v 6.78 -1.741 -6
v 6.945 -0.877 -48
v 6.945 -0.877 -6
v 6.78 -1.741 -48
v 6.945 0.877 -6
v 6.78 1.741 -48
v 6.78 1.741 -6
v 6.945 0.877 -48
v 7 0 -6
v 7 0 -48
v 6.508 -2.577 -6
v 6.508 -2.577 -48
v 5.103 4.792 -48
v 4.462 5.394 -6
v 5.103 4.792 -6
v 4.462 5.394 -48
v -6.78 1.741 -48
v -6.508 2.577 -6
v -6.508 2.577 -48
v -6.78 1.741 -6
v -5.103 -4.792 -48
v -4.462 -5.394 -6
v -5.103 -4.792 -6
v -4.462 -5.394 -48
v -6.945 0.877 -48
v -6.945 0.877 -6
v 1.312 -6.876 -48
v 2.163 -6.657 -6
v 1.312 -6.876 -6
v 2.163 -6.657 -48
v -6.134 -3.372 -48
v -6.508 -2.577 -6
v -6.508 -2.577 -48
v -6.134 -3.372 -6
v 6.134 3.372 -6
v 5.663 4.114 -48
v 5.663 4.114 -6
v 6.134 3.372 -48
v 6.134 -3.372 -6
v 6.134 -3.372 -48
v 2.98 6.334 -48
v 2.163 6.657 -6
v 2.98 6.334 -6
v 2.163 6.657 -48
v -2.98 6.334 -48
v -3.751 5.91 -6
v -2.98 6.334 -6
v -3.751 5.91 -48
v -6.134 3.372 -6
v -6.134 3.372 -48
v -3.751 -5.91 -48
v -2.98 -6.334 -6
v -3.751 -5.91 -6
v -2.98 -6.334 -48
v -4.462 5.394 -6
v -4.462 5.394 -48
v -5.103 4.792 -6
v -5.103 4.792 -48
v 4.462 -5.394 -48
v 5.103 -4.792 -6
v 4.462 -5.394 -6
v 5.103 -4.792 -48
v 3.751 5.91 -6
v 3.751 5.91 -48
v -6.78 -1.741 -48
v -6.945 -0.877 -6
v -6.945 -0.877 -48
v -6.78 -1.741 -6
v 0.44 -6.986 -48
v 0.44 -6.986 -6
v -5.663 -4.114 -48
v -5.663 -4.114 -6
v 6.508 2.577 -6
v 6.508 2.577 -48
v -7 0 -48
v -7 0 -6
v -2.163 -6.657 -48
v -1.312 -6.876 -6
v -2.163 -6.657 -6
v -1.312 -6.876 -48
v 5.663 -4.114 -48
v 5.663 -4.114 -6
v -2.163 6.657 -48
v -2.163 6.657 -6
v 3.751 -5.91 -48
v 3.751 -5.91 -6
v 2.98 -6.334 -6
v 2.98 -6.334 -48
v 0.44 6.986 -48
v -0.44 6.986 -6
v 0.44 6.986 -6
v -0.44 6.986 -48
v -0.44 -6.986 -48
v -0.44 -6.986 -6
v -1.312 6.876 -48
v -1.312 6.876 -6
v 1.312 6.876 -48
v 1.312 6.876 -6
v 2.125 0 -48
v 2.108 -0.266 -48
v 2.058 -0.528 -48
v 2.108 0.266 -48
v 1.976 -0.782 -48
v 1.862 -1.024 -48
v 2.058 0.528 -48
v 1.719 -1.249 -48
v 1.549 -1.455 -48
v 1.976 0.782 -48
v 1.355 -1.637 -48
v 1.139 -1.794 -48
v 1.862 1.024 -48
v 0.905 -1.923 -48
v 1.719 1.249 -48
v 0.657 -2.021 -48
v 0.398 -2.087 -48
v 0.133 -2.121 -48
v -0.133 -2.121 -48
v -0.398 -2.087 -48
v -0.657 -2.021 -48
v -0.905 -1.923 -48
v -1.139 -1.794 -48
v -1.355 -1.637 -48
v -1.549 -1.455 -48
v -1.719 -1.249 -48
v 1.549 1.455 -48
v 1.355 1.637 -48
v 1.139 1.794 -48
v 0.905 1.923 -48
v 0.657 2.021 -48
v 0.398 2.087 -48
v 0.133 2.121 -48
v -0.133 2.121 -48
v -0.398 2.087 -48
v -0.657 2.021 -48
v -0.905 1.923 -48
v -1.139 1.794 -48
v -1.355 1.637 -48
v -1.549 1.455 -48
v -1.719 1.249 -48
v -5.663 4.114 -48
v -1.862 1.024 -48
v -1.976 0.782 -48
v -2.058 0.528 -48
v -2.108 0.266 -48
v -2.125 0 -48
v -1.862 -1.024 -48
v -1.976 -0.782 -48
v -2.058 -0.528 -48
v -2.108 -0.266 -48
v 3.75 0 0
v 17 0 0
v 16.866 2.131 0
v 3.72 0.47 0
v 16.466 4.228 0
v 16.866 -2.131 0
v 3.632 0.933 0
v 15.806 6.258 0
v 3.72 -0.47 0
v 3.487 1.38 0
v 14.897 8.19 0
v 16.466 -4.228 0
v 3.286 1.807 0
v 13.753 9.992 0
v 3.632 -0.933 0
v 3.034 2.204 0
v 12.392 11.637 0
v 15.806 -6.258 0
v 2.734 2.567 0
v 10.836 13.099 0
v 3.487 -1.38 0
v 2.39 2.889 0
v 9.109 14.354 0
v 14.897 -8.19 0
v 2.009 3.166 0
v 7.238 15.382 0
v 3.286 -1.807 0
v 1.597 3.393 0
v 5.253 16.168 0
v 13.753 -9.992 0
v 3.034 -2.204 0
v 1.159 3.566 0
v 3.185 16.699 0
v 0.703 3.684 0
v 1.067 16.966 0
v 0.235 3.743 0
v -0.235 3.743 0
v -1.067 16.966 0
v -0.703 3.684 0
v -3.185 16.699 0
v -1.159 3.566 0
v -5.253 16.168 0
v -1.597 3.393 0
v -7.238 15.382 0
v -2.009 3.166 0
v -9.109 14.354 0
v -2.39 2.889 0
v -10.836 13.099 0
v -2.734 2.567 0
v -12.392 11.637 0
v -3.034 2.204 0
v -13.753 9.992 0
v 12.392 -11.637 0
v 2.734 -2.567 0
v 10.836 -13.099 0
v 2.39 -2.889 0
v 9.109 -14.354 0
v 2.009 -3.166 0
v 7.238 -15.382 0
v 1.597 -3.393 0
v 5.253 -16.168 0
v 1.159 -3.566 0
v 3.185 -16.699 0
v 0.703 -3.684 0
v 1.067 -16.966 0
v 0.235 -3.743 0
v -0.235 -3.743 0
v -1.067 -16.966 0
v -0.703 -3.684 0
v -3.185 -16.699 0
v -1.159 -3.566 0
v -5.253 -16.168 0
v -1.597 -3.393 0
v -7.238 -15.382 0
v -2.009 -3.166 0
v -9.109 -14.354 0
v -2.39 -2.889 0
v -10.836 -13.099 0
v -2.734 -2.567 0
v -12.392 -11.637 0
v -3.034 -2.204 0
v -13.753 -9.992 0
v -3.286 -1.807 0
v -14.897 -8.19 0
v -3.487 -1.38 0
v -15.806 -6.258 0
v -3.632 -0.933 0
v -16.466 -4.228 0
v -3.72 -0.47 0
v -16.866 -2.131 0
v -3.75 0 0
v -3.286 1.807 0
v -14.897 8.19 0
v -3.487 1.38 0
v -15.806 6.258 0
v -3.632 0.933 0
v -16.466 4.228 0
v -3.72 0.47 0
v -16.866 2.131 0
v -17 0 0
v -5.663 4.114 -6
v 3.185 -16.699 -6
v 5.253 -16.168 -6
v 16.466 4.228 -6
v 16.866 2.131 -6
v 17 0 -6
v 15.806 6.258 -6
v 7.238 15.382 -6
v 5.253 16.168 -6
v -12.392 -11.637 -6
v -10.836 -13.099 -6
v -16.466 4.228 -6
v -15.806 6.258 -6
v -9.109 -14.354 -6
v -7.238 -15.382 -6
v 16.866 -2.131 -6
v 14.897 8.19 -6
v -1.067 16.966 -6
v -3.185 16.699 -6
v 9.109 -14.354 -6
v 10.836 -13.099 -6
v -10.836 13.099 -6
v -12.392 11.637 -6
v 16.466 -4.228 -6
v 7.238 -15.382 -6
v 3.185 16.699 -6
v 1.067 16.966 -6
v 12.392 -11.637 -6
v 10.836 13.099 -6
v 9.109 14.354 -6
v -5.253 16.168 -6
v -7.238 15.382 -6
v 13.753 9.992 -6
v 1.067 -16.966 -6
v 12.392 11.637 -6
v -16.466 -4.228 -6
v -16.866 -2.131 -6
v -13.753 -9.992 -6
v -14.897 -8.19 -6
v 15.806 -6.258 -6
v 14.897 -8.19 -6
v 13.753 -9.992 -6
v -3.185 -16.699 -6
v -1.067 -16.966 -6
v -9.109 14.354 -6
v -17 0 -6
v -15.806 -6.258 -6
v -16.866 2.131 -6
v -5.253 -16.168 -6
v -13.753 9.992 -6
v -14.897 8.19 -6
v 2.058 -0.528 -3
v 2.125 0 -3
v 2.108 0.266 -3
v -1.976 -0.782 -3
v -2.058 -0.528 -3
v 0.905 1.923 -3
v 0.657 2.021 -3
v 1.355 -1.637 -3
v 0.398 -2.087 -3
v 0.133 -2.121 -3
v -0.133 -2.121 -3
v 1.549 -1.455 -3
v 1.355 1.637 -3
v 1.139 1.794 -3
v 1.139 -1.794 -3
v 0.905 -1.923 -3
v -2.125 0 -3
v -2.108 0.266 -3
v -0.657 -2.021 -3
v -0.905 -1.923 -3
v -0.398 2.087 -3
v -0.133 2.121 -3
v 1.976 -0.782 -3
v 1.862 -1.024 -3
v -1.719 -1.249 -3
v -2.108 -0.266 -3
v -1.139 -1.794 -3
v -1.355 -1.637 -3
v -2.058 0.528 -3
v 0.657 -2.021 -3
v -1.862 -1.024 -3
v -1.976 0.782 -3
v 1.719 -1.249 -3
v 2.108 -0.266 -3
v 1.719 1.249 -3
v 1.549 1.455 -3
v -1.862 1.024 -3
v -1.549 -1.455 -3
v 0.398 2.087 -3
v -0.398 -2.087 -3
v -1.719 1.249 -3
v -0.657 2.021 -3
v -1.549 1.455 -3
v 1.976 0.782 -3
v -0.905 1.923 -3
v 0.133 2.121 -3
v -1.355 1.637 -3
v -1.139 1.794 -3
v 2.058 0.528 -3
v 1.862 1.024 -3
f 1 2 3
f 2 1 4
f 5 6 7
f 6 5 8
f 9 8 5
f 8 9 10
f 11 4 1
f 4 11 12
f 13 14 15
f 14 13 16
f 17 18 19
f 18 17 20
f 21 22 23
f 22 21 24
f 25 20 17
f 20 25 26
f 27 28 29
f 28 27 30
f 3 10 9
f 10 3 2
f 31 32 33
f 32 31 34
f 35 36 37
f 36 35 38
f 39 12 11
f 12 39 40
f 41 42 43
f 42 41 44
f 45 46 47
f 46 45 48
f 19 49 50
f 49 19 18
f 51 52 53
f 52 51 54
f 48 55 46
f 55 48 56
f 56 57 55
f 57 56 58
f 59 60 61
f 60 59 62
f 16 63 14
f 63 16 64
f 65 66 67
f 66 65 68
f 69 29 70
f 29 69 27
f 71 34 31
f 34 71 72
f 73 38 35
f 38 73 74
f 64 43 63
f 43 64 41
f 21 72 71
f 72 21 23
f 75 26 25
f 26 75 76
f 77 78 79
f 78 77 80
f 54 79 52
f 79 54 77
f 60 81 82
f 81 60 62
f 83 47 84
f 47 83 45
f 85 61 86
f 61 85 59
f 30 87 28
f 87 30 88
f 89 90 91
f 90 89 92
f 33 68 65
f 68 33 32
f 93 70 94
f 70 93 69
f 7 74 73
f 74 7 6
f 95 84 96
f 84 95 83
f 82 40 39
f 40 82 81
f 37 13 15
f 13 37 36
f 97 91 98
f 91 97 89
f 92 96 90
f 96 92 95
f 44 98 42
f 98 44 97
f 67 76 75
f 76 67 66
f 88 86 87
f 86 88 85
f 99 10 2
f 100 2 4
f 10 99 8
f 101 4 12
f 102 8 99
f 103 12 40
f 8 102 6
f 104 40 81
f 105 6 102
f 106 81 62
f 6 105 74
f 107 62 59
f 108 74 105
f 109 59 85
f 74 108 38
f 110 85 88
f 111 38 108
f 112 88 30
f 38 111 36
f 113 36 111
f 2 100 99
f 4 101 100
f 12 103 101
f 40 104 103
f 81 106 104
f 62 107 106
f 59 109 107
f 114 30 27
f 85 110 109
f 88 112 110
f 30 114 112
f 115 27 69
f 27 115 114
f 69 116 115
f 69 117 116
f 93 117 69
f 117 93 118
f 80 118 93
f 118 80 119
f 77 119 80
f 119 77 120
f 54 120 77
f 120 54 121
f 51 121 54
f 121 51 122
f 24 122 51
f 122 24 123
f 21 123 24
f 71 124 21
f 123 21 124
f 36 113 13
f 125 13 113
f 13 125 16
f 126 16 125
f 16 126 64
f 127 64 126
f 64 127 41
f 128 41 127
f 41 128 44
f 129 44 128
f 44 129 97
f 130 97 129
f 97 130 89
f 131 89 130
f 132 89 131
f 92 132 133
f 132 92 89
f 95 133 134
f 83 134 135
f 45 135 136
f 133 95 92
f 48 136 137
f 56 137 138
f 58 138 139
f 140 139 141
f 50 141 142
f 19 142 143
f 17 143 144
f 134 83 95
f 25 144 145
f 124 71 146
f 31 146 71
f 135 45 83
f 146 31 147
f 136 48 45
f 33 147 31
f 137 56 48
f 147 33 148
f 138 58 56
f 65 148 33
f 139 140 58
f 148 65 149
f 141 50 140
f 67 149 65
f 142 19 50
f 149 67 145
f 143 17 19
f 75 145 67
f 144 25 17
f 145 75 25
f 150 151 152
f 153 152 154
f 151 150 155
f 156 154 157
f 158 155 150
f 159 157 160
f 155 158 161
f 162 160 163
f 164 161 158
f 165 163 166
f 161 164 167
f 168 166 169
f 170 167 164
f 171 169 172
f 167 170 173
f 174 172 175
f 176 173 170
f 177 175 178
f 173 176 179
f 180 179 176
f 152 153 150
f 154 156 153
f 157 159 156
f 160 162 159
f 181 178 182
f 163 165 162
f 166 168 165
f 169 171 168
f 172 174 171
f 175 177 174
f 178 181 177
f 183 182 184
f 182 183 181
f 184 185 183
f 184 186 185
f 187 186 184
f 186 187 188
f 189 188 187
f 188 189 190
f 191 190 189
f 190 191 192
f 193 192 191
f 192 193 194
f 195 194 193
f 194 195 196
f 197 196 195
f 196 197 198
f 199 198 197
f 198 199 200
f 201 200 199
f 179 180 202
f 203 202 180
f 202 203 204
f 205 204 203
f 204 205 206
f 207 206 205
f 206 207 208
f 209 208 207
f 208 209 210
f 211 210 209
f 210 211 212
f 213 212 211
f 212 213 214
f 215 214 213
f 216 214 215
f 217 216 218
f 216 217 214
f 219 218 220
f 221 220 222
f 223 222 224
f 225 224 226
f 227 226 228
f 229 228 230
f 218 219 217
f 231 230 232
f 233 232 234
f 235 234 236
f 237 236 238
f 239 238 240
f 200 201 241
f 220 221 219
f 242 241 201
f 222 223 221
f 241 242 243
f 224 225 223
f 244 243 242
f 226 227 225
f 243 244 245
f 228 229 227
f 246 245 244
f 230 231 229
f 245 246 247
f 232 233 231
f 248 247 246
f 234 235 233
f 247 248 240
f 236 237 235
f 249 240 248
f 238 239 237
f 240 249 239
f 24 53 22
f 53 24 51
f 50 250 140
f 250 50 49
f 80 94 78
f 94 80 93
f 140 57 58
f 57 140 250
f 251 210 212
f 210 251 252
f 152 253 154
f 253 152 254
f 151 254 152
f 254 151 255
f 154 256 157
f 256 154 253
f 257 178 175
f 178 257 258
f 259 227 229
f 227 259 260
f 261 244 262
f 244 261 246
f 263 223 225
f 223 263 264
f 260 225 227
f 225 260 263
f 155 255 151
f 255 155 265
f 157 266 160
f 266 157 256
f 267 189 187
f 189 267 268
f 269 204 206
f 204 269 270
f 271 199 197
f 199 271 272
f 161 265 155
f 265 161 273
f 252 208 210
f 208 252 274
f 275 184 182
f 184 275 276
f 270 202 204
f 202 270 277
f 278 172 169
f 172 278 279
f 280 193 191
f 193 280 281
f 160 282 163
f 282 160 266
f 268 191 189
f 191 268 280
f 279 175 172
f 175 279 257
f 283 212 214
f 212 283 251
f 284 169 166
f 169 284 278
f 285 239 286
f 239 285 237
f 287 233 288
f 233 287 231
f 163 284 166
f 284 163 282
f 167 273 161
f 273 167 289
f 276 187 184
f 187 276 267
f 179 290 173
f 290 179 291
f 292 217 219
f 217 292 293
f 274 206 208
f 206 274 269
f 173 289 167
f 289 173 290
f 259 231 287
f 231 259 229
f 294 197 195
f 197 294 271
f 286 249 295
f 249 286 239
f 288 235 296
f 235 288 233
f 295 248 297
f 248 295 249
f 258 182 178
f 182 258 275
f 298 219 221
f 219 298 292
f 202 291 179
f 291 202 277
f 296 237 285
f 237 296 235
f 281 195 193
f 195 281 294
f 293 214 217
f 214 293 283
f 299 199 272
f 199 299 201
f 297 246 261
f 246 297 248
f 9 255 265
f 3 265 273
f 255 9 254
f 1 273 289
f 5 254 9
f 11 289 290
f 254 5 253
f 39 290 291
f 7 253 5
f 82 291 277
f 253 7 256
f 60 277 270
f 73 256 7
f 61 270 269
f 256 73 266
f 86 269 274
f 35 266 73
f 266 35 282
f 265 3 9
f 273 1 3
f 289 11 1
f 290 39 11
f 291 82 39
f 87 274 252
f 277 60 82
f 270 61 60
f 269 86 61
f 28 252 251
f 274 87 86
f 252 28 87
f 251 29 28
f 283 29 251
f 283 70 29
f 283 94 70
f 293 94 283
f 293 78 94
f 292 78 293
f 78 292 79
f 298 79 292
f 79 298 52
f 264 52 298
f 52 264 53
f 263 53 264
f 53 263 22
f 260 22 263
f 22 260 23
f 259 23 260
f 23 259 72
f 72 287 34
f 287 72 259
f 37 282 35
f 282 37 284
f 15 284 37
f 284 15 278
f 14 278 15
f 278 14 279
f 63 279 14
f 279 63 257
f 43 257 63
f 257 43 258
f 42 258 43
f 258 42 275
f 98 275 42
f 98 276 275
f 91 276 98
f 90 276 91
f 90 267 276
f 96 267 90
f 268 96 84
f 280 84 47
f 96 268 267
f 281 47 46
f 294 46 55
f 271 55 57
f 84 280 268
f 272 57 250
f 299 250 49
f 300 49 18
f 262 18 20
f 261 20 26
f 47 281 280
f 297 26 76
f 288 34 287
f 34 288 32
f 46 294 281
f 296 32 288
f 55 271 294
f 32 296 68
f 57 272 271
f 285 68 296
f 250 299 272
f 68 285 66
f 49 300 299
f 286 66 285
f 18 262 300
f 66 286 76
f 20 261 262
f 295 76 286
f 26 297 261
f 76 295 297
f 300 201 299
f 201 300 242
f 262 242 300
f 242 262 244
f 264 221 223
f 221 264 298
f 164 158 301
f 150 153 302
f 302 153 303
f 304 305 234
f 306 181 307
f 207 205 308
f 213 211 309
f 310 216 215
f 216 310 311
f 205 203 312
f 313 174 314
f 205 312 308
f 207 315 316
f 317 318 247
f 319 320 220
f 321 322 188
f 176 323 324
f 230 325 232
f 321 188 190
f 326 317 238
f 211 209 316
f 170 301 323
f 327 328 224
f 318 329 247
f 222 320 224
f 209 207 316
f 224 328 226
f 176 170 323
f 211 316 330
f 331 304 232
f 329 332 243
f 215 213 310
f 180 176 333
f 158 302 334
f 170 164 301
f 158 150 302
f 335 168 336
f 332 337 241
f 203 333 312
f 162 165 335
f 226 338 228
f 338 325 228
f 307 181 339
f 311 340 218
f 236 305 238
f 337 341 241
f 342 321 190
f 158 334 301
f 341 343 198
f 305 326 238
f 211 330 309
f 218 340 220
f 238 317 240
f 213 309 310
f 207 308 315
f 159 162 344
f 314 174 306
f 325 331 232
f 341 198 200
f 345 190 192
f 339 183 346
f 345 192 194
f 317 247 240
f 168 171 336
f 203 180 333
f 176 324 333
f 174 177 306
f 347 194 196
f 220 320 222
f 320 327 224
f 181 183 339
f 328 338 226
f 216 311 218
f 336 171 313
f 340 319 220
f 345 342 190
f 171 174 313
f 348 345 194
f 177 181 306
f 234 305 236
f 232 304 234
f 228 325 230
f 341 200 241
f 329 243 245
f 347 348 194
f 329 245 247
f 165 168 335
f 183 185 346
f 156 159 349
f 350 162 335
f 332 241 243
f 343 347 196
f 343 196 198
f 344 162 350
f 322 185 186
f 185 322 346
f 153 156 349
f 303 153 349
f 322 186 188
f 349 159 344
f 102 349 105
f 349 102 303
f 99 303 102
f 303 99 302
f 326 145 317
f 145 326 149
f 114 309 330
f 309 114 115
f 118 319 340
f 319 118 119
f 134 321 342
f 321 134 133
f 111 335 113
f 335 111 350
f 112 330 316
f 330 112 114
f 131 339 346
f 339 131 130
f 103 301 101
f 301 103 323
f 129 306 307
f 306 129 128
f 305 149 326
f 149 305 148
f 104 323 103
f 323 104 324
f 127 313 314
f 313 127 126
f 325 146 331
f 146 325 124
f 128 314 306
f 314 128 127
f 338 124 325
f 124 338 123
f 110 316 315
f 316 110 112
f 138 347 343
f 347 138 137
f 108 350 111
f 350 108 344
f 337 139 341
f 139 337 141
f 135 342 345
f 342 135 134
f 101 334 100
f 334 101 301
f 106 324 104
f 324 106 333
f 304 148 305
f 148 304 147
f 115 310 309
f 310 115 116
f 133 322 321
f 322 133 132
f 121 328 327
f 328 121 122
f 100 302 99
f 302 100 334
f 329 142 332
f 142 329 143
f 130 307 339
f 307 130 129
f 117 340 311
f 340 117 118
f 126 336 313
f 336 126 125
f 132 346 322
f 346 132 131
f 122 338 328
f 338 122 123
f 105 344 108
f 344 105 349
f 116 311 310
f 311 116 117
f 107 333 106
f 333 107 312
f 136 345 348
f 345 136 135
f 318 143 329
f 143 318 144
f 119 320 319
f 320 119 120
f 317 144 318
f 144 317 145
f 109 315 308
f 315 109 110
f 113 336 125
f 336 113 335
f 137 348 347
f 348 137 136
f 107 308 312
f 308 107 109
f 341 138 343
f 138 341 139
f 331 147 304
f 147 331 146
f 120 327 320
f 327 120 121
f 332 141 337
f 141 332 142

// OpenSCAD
$fn = 50;


difference() {
	union() {
		translate(v = [0, 0, -48.0000000000]) {
			cylinder(h = 48, r = 7.0000000000);
		}
		translate(v = [0, 0, -6.0000000000]) {
			cylinder(h = 6, r = 17.0000000000);
		}
	}
	union() {
		translate(v = [0, 0, 0]) {
			rotate(a = [0, 0, 0]) {
				difference() {
					union() {
						#translate(v = [0, 0, -48.0000000000]) {
							cylinder(h = 48, r = 2.0000000000);
						}
						#translate(v = [0, 0, -3]) {
							cylinder(h = 3, r = 7.0000000000, r1 = 2.1250000000, r2 = 3.7500000000);
						}
						#translate(v = [0, 0, -48.0000000000]) {
							cylinder(h = 48, r = 2.1250000000);
						}
						#translate(v = [0, 0, -48.0000000000]) {
							cylinder(h = 48, r = 2.0000000000);
						}
					}
					union();
				}
			}
		}
	}
}
